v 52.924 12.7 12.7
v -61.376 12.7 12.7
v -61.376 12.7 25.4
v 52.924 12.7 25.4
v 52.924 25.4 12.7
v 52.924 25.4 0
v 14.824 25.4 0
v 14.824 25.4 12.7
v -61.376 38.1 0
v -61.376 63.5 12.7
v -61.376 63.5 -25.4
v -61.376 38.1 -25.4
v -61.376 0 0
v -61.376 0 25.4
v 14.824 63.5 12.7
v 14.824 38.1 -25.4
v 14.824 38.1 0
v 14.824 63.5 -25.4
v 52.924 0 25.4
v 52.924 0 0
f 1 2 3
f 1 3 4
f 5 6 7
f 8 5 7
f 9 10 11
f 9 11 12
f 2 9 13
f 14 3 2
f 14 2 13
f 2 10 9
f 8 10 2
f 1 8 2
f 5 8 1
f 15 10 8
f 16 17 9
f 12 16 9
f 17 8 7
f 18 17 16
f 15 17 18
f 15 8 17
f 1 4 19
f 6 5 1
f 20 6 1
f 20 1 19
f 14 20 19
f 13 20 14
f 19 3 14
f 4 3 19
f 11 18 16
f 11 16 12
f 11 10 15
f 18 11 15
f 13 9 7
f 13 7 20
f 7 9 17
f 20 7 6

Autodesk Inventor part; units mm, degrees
ref_plane "YZ Plane" through (0, 0, 0) normal (1, 0, 0) x (0, 1, 0)
ref_plane "XZ Plane" through (0, 0, 0) normal (0, 1, 0) x (-1, 0, 0)
ref_plane "XY Plane" through (0, 0, 0) normal (0, 0, 1) x (1, 0, 0)
sketch "Sketch1" plane through (0, 0, 0) normal (0, 0, 1) x (1, 0, 0)
  line L0 (-61.3765, 63.5) -> (14.8235, 63.5)
  line L1 (52.9235, 25.4) -> (52.9235, 0)
  line L2 (52.9235, 0) -> (-61.3765, 0)
  line L3 (-61.3765, 0) -> (-61.3765, 63.5)
  line L4 (52.9235, 25.4) -> (14.8235, 25.4)
  line L5 (14.8235, 25.4) -> (14.8235, 63.5)
  point P0 (0, 0)
  dimension "d0" = 38.1
  dimension "d1" = 76.2
  dimension "d2" = 38.1
  dimension "d3" = 114.3
  dimension "d4" = 63.5
  dimension "d5" = 25.4
extrude "Extrusion1" add sketch "Sketch1" along normal blind 12.7
sketch "Sketch2" plane through (0, 0, 12.7) normal (0, 0, 1) x (1, 0, 0)
  line L0 (-61.3765, 0) -> (52.9235, 0) projected
  line L1 (-61.3765, 63.5) -> (-61.3765, 0) projected
  line L2 (52.9235, 0) -> (-61.3765, 0)
  line L3 (-61.3765, 0) -> (-61.3765, 12.7)
  line L4 (-61.3765, 12.7) -> (52.9235, 12.7)
  line L5 (52.9235, 12.7) -> (52.9235, 0)
  point P0 (0, 0)
  dimension "d8" = 12.7
extrude "Extrusion2" add sketch "Sketch2" along normal blind 12.7
sketch "Sketch3" plane through (0, 0, 0) normal (0, 0, -1) x (-1, 0, 0)
  line L0 (61.3765, 63.5) -> (61.3765, 12.7) projected
  line L1 (-14.8235, 25.4) -> (-14.8235, 63.5) projected
  line L2 (61.3765, 63.5) -> (-14.8235, 63.5)
  line L3 (-14.8235, 63.5) -> (-14.8235, 38.1)
  line L4 (-14.8235, 38.1) -> (61.3765, 38.1)
  line L5 (61.3765, 38.1) -> (61.3765, 63.5)
  point P0 (0, 0)
  dimension "d11" = 25.4
extrude "Extrusion3" add sketch "Sketch3" along normal blind 25.4
